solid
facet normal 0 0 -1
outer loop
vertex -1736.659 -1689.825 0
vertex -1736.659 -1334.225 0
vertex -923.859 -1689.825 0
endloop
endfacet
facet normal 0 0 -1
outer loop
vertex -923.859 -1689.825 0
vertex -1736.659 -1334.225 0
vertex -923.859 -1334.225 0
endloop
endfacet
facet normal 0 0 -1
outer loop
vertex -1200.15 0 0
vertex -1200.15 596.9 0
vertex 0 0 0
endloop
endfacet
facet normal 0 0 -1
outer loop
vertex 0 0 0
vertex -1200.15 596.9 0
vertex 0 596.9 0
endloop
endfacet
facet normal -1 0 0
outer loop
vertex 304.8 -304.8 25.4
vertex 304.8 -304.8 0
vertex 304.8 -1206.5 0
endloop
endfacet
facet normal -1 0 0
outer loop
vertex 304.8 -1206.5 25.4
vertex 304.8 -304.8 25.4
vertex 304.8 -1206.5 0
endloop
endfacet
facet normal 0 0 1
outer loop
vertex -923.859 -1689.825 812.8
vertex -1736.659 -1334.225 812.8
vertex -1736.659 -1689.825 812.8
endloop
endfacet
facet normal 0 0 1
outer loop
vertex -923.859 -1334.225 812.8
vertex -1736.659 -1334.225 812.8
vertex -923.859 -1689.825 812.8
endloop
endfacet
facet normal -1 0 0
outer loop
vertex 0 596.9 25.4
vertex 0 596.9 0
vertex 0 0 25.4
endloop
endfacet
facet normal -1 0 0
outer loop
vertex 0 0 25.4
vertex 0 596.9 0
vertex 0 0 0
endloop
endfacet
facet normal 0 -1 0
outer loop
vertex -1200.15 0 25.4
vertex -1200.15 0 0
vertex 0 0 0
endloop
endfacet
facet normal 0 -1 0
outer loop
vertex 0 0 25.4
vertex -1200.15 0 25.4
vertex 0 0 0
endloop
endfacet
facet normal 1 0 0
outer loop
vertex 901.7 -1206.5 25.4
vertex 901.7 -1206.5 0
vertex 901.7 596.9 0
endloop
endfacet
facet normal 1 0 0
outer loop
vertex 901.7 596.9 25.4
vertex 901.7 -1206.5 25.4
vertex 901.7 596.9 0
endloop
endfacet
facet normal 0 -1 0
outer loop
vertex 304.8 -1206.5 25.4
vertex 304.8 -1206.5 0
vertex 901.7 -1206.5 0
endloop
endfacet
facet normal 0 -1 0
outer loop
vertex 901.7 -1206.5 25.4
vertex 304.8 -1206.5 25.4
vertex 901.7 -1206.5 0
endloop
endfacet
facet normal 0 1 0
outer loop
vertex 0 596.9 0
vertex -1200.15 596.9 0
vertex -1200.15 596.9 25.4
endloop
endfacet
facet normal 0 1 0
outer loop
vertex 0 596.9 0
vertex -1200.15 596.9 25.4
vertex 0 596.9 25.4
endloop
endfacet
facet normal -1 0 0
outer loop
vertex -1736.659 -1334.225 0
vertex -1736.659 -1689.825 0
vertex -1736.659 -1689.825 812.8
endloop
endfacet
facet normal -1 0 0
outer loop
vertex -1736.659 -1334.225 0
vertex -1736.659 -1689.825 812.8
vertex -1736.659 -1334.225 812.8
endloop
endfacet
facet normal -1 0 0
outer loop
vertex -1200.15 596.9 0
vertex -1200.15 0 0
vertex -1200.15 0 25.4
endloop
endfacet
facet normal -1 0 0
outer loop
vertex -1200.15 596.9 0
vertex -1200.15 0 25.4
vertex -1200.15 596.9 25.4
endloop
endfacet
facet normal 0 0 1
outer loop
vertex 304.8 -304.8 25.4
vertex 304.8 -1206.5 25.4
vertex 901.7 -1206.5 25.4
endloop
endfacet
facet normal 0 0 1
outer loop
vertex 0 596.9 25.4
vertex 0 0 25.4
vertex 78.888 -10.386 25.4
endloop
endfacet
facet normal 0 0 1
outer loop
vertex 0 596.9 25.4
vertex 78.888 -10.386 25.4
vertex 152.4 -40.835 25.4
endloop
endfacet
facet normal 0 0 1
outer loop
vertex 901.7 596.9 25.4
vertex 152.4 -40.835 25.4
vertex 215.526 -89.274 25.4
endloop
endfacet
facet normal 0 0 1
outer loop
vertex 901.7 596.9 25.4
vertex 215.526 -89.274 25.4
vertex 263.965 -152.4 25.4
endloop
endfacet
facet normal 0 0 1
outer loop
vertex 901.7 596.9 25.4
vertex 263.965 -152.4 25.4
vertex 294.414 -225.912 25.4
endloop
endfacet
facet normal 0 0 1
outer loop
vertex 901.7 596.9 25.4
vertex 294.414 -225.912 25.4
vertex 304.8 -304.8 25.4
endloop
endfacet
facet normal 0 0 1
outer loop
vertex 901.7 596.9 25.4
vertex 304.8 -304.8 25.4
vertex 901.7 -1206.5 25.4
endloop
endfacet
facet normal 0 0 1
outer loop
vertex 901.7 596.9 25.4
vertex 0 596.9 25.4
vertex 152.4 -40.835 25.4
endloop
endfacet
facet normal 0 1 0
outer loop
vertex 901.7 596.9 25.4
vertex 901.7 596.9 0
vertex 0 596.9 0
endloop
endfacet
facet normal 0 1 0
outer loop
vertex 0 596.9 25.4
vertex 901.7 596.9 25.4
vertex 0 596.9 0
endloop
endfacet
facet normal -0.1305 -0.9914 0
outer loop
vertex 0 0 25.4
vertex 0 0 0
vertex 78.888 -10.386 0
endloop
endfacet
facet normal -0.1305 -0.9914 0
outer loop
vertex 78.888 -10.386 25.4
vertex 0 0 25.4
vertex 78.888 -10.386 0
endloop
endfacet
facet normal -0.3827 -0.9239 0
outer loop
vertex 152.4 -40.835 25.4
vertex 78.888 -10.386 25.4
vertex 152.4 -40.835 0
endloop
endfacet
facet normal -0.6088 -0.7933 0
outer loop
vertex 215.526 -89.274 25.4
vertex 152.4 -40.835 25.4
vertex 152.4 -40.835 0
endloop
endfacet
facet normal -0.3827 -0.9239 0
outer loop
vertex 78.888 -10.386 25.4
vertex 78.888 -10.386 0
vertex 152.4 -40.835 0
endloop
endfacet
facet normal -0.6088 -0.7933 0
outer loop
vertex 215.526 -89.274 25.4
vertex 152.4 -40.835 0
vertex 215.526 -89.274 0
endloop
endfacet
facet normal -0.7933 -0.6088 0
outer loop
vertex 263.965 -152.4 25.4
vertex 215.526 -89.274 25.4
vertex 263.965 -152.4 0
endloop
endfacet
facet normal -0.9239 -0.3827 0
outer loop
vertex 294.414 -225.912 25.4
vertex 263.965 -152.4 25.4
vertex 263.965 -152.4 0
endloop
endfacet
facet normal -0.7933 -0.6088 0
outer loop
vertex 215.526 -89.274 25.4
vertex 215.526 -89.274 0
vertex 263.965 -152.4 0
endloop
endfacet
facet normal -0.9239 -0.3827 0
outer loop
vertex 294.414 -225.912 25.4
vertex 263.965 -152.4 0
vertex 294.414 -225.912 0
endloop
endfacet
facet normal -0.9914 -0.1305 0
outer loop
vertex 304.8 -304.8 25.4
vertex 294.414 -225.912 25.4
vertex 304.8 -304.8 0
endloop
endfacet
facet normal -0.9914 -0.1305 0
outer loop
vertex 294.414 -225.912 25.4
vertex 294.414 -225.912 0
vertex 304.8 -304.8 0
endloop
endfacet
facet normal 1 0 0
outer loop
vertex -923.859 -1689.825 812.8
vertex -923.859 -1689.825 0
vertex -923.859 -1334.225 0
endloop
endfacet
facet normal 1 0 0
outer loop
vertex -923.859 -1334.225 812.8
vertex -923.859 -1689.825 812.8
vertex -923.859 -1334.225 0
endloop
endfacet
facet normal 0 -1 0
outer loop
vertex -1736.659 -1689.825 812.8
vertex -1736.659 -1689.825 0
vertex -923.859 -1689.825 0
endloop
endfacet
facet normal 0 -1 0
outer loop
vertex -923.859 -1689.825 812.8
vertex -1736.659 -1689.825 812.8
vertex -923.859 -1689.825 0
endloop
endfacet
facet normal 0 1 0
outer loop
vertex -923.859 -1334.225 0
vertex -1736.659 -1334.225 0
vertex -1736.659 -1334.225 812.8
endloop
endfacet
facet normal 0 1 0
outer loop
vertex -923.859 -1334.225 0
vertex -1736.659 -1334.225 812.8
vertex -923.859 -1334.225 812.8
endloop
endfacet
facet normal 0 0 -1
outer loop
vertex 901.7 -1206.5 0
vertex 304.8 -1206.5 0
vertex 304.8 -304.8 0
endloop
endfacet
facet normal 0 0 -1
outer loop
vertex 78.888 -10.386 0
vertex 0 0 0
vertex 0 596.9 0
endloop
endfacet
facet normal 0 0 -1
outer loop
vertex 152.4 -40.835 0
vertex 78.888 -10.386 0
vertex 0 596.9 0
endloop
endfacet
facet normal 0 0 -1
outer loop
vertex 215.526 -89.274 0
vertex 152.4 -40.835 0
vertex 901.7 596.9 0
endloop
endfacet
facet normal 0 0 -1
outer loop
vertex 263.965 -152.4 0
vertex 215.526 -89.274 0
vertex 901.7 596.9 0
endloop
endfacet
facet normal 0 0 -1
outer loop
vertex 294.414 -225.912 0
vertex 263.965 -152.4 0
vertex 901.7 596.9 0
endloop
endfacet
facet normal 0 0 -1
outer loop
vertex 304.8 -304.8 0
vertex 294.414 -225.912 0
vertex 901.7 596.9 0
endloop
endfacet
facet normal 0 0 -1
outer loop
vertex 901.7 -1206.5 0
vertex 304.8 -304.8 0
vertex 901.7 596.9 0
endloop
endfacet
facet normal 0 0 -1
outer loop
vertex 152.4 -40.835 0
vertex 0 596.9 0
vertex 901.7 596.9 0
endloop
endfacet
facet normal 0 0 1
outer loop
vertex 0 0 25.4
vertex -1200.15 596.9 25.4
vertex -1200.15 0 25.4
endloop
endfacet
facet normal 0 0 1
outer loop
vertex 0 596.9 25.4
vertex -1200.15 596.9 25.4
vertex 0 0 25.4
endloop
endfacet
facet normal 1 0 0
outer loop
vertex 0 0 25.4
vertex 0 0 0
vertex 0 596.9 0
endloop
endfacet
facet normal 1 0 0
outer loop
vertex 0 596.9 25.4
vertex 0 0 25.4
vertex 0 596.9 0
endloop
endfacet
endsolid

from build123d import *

# Parameters (mm, degrees)
F0_W     = 1200.15
F0_H     = 596.9
F1_DEPTH = 25.4
F2_DEPTH = 25.4
F3_W     = 812.8
F3_H     = 355.6
F4_DEPTH = 812.8


with BuildPart() as f1:
    # F0 (on Top) → F1 (new body)
    with BuildSketch(Plane.XY):
        with Locations((-600.075, 298.45)):
            Rectangle(F0_W, F0_H)
    extrude(amount=F1_DEPTH)


with BuildPart() as f2:
    # F0 (on Top) → F2 (new body)
    with BuildSketch(Plane.XY):
        with BuildLine():
            Line((0, 596.9), (0, 0))
            ThreePointArc((0, 0), (215.526147, -89.273853), (304.8, -304.8))
            Line((304.8, -304.8), (304.8, -1206.5))
            Line((304.8, -1206.5), (901.7, -1206.5))
            Line((901.7, -1206.5), (901.7, 596.9))
            Line((901.7, 596.9), (0, 596.9))
        make_face()
    extrude(amount=F2_DEPTH)


with BuildPart() as f4:
    # F3 (on face) → F4 (new body)
    with BuildSketch(Plane.XY):
        with Locations((-1330.259169, -1512.025296)):
            Rectangle(F3_W, F3_H)
    extrude(amount=F4_DEPTH)


solid = Compound([f1.part, f2.part, f4.part])
